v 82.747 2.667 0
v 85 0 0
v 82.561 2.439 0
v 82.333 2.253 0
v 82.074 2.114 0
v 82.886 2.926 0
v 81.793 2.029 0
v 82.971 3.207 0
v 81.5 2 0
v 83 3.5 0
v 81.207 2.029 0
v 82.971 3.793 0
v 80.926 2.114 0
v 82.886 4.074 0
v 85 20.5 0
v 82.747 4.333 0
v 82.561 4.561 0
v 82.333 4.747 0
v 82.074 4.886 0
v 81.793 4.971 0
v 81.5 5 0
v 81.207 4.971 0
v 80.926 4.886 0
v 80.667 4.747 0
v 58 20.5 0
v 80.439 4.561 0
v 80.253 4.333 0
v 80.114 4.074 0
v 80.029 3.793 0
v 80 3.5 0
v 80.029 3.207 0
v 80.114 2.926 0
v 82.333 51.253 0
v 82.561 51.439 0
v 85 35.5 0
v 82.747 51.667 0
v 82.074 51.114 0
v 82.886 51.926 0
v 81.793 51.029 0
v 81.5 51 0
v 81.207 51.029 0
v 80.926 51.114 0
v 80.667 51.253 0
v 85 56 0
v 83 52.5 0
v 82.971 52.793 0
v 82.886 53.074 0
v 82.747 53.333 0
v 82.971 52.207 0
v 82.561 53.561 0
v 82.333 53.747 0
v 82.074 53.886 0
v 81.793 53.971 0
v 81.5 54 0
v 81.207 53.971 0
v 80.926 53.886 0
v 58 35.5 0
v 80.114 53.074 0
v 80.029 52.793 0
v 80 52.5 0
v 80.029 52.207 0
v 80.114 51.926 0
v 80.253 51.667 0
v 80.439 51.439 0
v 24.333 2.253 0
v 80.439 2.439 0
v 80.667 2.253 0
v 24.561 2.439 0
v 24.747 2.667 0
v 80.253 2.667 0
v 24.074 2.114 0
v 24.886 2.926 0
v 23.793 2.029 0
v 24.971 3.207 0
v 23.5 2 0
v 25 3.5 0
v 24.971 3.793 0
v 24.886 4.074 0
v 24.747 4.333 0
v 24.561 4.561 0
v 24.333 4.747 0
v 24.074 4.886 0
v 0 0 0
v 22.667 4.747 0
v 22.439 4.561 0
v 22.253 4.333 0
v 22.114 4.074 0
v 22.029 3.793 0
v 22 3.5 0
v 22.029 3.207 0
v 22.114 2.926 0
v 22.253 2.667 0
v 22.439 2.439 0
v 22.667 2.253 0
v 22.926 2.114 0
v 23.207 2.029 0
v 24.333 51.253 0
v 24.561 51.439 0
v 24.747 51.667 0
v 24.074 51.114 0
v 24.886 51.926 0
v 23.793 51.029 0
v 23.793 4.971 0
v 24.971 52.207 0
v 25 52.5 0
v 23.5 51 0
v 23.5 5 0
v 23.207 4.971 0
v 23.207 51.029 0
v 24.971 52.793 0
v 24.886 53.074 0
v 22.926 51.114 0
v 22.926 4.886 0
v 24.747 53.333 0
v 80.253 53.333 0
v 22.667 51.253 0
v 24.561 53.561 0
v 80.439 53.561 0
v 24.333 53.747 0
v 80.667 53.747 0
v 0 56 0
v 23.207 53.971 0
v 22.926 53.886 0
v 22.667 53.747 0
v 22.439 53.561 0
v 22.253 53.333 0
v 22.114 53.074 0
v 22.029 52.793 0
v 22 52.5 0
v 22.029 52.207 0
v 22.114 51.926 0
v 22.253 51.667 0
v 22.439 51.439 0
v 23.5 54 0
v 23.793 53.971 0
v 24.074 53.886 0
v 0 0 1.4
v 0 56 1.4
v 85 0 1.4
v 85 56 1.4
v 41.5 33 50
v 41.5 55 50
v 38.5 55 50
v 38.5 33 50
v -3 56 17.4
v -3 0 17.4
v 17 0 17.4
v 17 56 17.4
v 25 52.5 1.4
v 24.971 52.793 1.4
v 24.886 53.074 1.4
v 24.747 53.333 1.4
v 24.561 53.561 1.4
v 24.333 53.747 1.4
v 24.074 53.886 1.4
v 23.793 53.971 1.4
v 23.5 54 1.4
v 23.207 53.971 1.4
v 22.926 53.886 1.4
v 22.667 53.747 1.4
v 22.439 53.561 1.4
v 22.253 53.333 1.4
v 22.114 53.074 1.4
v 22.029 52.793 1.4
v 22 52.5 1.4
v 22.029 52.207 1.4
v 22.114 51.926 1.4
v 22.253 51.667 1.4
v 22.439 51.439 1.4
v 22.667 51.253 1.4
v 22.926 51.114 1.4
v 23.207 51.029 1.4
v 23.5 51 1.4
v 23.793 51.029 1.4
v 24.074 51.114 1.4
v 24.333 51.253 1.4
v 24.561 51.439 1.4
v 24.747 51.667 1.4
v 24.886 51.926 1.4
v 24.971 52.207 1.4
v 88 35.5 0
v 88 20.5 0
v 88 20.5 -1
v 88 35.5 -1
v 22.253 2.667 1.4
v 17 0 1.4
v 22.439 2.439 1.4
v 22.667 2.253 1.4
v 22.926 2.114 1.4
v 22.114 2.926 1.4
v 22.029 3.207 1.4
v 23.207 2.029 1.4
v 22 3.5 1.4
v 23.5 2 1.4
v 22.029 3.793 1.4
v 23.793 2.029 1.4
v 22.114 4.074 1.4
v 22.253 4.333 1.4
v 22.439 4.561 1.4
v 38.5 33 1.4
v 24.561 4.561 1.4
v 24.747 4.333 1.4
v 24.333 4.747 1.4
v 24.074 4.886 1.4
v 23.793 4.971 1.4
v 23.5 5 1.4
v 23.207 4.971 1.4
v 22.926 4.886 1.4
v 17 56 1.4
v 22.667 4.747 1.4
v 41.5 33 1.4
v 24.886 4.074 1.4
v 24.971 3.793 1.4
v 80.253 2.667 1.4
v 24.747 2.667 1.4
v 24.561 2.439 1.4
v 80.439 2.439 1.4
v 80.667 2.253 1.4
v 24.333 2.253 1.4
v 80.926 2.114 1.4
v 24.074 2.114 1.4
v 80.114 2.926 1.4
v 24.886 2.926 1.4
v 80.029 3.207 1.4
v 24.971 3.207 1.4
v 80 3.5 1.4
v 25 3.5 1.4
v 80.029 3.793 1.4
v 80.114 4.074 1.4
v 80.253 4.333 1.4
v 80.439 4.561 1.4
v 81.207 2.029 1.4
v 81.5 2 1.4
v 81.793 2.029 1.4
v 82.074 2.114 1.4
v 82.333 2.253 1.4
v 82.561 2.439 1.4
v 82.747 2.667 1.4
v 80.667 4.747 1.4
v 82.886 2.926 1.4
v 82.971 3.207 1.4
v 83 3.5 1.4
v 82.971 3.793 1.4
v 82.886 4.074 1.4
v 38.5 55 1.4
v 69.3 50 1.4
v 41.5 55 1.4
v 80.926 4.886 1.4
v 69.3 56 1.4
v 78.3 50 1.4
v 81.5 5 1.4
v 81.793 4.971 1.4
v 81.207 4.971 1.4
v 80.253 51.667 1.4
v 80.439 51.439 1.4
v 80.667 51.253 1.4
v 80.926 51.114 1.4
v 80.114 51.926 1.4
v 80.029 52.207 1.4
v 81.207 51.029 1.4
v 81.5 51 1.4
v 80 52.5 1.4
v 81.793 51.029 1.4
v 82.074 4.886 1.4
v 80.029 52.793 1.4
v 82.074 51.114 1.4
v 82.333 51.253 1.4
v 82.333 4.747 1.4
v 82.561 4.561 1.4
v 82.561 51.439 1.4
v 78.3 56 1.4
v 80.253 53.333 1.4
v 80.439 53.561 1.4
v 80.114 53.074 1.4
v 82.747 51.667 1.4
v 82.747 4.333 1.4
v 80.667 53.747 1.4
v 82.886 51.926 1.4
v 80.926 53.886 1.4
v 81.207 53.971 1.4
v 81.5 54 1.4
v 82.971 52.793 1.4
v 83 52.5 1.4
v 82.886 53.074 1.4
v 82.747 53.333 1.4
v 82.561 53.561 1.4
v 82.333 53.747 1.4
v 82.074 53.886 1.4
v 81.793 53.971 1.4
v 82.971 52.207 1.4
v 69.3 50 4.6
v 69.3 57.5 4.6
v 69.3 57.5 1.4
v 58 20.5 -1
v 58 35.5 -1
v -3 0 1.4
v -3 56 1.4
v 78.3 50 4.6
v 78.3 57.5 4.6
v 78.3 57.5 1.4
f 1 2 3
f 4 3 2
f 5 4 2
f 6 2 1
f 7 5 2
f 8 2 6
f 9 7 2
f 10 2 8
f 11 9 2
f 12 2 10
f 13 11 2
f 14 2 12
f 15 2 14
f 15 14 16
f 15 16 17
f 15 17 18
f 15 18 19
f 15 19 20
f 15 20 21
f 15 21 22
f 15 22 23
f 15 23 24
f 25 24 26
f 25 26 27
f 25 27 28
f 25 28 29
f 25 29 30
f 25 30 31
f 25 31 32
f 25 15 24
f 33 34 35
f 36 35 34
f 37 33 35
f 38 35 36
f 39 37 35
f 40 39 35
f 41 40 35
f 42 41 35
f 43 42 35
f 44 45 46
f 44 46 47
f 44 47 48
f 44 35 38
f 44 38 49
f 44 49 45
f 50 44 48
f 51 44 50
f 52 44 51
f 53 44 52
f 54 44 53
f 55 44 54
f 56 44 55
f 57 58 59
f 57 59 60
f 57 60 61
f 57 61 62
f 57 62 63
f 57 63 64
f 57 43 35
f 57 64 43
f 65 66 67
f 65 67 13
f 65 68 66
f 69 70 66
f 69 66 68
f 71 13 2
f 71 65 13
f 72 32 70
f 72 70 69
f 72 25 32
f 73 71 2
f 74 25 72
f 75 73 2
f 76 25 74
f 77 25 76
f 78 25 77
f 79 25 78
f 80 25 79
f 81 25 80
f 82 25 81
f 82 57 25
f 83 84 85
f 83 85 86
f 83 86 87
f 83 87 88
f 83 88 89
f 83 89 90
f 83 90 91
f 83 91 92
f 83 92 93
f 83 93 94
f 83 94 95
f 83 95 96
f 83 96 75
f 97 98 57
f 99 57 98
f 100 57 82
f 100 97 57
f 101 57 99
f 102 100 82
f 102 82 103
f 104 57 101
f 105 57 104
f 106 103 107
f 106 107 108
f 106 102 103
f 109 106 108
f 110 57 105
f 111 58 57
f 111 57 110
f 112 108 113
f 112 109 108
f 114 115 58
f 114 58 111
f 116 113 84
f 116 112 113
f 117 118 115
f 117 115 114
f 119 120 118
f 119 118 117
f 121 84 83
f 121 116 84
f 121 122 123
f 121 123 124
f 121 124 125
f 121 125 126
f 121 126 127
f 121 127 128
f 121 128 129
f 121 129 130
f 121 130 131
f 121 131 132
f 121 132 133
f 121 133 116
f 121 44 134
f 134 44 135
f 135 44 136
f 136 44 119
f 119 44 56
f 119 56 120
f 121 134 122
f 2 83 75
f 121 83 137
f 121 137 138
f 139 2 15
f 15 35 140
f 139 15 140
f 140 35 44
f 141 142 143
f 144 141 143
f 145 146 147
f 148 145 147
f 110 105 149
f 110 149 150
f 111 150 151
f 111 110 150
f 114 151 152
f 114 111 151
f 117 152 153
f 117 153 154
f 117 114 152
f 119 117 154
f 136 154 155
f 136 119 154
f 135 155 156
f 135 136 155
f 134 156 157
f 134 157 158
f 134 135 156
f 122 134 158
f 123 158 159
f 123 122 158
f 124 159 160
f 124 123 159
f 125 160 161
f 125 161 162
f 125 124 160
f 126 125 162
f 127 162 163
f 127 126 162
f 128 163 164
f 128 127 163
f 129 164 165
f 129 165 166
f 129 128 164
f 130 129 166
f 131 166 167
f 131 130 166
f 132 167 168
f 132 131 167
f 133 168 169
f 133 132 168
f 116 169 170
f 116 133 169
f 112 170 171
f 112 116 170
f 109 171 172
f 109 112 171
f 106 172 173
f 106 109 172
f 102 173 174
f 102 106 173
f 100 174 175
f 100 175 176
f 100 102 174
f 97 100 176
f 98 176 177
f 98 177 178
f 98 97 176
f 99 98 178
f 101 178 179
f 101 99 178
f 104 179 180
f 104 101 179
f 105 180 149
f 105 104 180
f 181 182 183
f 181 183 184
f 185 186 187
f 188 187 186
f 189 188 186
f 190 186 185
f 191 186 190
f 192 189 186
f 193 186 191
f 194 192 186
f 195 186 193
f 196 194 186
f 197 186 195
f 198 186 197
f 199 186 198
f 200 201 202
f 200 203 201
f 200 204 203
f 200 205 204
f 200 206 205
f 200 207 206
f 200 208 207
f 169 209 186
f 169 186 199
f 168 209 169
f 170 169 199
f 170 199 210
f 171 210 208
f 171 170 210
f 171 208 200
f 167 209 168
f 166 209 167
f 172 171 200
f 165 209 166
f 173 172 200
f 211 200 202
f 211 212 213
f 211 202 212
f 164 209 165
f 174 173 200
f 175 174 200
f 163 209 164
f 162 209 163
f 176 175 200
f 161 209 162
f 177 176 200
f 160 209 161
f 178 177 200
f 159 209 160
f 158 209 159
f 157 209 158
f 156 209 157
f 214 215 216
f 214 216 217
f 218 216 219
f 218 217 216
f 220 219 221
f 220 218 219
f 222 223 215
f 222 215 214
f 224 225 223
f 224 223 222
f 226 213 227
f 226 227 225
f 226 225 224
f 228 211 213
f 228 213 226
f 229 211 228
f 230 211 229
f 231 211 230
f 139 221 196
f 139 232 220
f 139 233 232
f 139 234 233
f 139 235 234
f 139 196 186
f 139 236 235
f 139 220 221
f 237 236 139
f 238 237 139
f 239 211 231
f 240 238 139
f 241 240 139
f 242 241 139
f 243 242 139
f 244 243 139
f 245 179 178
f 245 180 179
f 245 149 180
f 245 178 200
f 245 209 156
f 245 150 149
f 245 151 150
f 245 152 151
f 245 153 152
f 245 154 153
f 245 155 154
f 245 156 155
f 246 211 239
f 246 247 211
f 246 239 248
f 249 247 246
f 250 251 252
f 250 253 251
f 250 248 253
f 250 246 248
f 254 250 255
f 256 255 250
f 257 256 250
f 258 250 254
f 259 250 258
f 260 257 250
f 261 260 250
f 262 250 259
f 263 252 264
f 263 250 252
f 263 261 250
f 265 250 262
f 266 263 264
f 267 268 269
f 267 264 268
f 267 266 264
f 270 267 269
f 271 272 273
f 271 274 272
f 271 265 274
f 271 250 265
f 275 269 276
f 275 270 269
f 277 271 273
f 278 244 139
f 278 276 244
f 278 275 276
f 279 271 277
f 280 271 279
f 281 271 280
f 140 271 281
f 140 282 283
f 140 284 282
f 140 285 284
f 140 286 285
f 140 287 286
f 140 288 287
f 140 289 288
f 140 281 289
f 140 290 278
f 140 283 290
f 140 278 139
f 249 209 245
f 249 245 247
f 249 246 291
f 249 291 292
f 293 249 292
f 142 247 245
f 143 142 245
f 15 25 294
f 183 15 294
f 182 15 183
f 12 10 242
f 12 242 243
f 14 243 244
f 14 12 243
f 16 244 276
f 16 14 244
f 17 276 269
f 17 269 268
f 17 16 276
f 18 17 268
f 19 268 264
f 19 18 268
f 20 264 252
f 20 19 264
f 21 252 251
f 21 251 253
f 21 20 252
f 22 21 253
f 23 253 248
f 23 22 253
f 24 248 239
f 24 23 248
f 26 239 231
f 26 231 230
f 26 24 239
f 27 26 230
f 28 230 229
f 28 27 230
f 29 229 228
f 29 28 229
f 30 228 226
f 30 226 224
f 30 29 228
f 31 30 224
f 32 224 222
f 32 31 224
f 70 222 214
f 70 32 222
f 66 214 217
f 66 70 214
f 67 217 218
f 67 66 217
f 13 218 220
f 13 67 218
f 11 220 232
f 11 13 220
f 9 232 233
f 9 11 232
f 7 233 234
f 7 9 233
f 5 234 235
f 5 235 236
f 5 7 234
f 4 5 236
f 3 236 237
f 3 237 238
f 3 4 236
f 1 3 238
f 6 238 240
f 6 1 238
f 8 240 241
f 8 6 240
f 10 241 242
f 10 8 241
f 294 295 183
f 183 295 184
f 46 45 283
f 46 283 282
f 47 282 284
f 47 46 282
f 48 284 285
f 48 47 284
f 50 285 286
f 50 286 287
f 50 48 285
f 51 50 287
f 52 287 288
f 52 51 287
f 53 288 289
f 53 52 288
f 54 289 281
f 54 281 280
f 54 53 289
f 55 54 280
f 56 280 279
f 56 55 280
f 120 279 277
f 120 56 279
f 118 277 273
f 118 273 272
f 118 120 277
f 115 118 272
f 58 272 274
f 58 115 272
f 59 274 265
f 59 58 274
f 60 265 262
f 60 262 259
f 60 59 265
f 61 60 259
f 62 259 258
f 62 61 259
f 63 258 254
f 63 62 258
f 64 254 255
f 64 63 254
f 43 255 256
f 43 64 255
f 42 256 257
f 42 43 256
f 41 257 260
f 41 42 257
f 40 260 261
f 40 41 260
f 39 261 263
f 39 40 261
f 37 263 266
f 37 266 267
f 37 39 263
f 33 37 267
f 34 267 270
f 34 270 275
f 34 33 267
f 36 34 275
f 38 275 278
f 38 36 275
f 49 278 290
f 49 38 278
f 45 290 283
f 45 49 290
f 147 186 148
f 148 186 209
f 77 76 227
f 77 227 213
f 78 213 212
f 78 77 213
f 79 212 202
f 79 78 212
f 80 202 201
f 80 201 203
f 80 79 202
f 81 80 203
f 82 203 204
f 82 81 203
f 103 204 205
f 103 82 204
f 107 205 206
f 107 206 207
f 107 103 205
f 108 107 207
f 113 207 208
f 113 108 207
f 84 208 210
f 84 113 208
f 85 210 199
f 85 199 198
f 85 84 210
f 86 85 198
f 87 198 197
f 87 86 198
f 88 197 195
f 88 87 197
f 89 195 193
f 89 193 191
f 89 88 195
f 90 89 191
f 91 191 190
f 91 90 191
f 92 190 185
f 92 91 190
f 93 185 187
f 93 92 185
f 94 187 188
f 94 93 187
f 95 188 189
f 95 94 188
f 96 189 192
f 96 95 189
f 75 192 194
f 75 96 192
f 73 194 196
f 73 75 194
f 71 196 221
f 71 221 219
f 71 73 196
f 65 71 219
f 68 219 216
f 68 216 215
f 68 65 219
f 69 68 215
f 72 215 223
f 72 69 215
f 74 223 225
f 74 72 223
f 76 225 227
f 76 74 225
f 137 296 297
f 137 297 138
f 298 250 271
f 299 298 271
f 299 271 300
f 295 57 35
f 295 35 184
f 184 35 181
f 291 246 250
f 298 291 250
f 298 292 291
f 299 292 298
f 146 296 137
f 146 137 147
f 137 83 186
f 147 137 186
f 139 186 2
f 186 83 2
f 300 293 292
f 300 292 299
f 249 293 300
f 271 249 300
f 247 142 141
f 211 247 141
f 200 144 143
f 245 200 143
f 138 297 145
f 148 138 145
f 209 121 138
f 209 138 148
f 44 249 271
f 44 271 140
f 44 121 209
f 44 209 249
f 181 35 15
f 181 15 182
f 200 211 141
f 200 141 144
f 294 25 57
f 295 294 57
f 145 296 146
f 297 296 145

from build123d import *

# Parameters (mm, degrees)
SKETCH005_W  = 85
SKETCH005_H  = 56
SKETCH005_R  = 1.5
PAD003_DEPTH = 1.4
SKETCH009_W  = 20
SKETCH009_H  = 56
PAD007_DEPTH = 16
SKETCH010_W  = 30
SKETCH010_H  = 15
PAD008_DEPTH = 1
SKETCH011_W  = 9
SKETCH011_H  = 7.5
PAD009_DEPTH = 3.2
PAD010_DEPTH = 50


with BuildPart() as part:
    # Sketch005 → Pad003 (new body)
    with BuildSketch(Plane.XY):
        with Locations((42.5, 28)):
            Rectangle(SKETCH005_W, SKETCH005_H)
        with Locations((23.5, 52.5)):
            Circle(SKETCH005_R, mode=Mode.SUBTRACT)
        with Locations((23.5, 3.5)):
            Circle(SKETCH005_R, mode=Mode.SUBTRACT)
        with Locations((81.5, 52.5)):
            Circle(SKETCH005_R, mode=Mode.SUBTRACT)
        with Locations((81.5, 3.5)):
            Circle(SKETCH005_R, mode=Mode.SUBTRACT)
    extrude(amount=PAD003_DEPTH)

    # Sketch009 → Pad007 (join)
    with BuildSketch(Plane.XY.offset(1.4)):
        with Locations((7, 28)):
            Rectangle(SKETCH009_W, SKETCH009_H)
    extrude(amount=PAD007_DEPTH)

    # Sketch010 → Pad008 (join)
    with BuildSketch(Plane.XY):
        with Locations((73, 28)):
            Rectangle(SKETCH010_W, SKETCH010_H)
    extrude(amount=-PAD008_DEPTH)

    # Sketch011 → Pad009 (join)
    with BuildSketch(Plane.XY.offset(1.4)):
        with Locations((73.8, 53.75)):
            Rectangle(SKETCH011_W, SKETCH011_H)
    extrude(amount=PAD009_DEPTH)

    # Sketch013 → Pad010 (join)
    with BuildSketch(Plane.XY):
        Polygon((41.5, 55), (41.5, 33), (38.5, 33), (38.5, 55), (40, 55), align=None)
    extrude(amount=PAD010_DEPTH)


solid = part.part
